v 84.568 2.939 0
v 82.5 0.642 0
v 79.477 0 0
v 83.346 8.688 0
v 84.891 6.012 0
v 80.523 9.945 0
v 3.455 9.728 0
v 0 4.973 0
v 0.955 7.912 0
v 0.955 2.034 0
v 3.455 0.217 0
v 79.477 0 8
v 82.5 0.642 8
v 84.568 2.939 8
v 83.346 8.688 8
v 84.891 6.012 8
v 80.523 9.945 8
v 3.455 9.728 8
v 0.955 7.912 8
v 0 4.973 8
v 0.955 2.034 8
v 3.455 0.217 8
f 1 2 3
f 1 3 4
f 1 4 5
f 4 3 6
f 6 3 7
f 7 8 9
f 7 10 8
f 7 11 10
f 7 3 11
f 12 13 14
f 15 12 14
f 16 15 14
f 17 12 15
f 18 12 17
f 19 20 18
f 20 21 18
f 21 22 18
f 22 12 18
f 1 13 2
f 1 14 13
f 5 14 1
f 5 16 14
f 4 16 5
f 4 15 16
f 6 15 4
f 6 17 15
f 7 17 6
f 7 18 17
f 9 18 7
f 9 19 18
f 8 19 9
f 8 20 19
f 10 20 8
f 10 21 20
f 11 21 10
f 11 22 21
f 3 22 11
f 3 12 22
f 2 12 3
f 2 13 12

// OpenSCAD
$fn = 32;

// ----------------------------------------------------------------------
// Key bar: parallel key, 8 mm thick
// ----------------------------------------------------------------------

// --- parameters (mm) ---
profile_height = 8;       // extrusion height
profile_points = 11;      // points of the closed outline

profile = [[0, 4.973], [0.955, 2.034], [3.455, 0.217], [79.477, 0], [82.5, 0.642], [84.568, 2.939], [84.891, 6.012], [83.346, 8.688], [80.523, 9.945], [3.455, 9.728], [0.955, 7.912]];  // single closed polygon, 11 points, counter clockwise

// --- the one profile operation ---
linear_extrude(height = profile_height) polygon(points = profile);
